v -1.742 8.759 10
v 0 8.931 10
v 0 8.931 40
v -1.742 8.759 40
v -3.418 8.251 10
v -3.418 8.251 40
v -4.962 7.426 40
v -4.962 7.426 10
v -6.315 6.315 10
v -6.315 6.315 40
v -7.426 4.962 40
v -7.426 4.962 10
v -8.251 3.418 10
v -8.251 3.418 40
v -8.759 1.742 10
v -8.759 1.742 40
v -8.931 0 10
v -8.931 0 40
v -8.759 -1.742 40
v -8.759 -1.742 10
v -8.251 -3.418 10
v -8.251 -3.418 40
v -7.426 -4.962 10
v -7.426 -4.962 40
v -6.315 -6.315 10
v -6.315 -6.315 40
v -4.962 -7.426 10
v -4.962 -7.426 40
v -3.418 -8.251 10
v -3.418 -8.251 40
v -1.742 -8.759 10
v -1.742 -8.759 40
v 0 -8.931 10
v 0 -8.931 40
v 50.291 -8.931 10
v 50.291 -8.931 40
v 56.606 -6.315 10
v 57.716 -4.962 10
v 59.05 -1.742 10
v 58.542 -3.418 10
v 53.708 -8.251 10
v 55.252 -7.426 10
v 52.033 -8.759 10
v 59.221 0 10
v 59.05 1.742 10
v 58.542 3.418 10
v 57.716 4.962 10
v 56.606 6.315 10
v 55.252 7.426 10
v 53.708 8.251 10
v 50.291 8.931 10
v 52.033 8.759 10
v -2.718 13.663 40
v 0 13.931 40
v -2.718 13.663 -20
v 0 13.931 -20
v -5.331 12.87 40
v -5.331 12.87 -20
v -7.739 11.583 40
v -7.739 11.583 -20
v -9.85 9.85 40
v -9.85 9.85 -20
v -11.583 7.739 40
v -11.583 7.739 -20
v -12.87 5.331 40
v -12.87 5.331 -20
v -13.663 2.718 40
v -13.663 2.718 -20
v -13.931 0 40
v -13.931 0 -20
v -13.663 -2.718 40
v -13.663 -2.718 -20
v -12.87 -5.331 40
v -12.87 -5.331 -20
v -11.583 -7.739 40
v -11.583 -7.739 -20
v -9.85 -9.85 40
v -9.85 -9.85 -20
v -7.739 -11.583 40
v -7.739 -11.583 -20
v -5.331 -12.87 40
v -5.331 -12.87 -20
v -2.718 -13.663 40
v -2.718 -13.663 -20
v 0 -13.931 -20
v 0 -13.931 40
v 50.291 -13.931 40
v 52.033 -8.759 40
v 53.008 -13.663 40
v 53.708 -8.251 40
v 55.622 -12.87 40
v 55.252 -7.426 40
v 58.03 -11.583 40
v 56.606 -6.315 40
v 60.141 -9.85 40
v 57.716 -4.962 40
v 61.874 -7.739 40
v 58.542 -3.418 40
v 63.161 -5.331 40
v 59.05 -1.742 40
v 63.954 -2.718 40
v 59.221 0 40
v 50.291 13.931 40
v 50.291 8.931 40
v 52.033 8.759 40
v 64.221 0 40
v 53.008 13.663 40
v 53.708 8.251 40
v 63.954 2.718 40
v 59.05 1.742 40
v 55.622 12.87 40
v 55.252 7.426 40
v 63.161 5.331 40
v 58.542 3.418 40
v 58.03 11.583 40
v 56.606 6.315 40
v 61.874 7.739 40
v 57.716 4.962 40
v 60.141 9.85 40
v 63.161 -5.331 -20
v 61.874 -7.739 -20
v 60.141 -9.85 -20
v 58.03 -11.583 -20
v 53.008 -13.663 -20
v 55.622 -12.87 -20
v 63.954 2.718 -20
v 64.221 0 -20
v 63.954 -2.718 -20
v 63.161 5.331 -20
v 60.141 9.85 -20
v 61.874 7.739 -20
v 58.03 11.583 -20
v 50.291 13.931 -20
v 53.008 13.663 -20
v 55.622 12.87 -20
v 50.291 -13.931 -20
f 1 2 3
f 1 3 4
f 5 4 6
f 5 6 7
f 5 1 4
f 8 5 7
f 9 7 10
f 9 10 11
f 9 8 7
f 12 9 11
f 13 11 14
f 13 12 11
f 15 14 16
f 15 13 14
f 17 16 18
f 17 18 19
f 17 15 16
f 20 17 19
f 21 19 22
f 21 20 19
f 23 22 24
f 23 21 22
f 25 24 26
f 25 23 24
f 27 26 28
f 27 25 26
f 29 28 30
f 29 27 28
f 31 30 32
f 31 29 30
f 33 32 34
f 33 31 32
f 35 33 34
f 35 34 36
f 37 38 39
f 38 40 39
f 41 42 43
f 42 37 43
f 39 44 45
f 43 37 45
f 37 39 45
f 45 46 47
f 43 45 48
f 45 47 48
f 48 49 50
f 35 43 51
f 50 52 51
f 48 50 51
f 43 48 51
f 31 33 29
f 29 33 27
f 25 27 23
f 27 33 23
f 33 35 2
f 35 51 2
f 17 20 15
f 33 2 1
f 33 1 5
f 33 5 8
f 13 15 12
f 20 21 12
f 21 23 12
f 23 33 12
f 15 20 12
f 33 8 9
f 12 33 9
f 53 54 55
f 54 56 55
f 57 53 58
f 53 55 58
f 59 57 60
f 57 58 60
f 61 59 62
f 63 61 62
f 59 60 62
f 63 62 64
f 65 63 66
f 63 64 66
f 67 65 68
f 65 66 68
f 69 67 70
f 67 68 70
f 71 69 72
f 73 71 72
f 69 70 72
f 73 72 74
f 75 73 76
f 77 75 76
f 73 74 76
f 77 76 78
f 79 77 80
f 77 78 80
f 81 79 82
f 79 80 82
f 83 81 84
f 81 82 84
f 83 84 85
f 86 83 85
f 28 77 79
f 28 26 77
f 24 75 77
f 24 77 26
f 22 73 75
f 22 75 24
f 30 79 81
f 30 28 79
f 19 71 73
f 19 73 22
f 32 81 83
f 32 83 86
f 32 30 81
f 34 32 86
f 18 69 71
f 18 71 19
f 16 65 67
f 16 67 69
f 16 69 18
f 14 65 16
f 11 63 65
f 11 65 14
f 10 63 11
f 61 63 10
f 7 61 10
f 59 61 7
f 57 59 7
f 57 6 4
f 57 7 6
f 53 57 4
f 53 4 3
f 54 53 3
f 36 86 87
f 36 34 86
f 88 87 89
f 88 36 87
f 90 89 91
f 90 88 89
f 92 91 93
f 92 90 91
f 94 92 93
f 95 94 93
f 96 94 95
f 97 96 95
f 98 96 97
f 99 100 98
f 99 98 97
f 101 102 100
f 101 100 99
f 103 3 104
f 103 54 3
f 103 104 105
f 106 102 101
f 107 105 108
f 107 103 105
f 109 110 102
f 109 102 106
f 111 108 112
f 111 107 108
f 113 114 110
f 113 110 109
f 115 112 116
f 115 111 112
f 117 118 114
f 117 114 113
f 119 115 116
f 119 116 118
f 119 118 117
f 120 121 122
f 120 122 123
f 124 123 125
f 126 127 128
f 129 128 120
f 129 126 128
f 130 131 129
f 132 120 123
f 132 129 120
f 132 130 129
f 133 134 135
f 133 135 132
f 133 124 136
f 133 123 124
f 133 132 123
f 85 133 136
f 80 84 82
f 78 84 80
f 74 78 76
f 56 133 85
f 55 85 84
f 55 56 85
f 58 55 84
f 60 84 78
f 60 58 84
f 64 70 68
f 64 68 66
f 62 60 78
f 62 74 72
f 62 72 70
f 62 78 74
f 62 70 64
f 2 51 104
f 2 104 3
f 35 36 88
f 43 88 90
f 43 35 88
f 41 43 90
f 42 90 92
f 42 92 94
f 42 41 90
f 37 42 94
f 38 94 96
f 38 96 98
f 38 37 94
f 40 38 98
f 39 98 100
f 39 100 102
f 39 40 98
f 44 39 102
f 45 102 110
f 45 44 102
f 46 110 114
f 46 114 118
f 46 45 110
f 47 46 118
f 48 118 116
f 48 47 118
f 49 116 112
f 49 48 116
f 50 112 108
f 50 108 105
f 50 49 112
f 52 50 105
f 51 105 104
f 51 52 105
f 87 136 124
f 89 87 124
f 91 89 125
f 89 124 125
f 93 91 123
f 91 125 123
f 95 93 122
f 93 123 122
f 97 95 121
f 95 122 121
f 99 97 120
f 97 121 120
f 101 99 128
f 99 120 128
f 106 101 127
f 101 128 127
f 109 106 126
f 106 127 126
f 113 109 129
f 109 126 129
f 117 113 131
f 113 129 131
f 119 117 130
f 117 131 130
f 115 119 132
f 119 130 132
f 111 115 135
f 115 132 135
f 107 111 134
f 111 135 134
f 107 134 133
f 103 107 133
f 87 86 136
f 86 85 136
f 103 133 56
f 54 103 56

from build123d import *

# Parameters (mm, degrees)
EXTRUDE_1_DEPTH      = 10
EXTRUDE_1_DEPTH_BACK = 20
EXTRUDE_1_2_DEPTH    = 30


with BuildPart() as part:
    # 草图1 → Extrude 1 (new, two sides: drawn at the far end of the back side and taken through both)
    with BuildSketch(Plane.XY.offset(-EXTRUDE_1_DEPTH_BACK)):
        with BuildLine():
            Line((0, 13.930688276), (50.29066082, 13.930688276))
            ThreePointArc((50.29066082, 13.930688276), (64.221349097, 0), (50.29066082, -13.930688276))
            Line((50.29066082, -13.930688276), (0, -13.930688276))
            ThreePointArc((0, -13.930688276), (-13.930688276, 0), (0, 13.930688276))
        make_face()
    extrude(amount=EXTRUDE_1_DEPTH + EXTRUDE_1_DEPTH_BACK)

    # 草图7 → Extrude 1 2 (add)
    with BuildSketch(Plane.XY.offset(10)):
        with BuildLine():
            Line((50.29066082, 13.930688276), (0, 13.930688276))
            ThreePointArc((0, 13.930688276), (-13.930688276, 0), (0, -13.930688276))
            Line((0, -13.930688276), (50.29066082, -13.930688276))
            ThreePointArc((50.29066082, -13.930688276), (64.221349097, 0), (50.29066082, 13.930688276))
        make_face()
        with BuildLine():
            Line((50.29066082, 8.930688276), (0, 8.930688276))
            ThreePointArc((0, 8.930688276), (-8.930688276, 0), (0, -8.930688276))
            Line((0, -8.930688276), (50.29066082, -8.930688276))
            ThreePointArc((50.29066082, -8.930688276), (59.221349097, 0), (50.29066082, 8.930688276))
        make_face(mode=Mode.SUBTRACT)
    extrude(amount=EXTRUDE_1_2_DEPTH)


solid = part.part
